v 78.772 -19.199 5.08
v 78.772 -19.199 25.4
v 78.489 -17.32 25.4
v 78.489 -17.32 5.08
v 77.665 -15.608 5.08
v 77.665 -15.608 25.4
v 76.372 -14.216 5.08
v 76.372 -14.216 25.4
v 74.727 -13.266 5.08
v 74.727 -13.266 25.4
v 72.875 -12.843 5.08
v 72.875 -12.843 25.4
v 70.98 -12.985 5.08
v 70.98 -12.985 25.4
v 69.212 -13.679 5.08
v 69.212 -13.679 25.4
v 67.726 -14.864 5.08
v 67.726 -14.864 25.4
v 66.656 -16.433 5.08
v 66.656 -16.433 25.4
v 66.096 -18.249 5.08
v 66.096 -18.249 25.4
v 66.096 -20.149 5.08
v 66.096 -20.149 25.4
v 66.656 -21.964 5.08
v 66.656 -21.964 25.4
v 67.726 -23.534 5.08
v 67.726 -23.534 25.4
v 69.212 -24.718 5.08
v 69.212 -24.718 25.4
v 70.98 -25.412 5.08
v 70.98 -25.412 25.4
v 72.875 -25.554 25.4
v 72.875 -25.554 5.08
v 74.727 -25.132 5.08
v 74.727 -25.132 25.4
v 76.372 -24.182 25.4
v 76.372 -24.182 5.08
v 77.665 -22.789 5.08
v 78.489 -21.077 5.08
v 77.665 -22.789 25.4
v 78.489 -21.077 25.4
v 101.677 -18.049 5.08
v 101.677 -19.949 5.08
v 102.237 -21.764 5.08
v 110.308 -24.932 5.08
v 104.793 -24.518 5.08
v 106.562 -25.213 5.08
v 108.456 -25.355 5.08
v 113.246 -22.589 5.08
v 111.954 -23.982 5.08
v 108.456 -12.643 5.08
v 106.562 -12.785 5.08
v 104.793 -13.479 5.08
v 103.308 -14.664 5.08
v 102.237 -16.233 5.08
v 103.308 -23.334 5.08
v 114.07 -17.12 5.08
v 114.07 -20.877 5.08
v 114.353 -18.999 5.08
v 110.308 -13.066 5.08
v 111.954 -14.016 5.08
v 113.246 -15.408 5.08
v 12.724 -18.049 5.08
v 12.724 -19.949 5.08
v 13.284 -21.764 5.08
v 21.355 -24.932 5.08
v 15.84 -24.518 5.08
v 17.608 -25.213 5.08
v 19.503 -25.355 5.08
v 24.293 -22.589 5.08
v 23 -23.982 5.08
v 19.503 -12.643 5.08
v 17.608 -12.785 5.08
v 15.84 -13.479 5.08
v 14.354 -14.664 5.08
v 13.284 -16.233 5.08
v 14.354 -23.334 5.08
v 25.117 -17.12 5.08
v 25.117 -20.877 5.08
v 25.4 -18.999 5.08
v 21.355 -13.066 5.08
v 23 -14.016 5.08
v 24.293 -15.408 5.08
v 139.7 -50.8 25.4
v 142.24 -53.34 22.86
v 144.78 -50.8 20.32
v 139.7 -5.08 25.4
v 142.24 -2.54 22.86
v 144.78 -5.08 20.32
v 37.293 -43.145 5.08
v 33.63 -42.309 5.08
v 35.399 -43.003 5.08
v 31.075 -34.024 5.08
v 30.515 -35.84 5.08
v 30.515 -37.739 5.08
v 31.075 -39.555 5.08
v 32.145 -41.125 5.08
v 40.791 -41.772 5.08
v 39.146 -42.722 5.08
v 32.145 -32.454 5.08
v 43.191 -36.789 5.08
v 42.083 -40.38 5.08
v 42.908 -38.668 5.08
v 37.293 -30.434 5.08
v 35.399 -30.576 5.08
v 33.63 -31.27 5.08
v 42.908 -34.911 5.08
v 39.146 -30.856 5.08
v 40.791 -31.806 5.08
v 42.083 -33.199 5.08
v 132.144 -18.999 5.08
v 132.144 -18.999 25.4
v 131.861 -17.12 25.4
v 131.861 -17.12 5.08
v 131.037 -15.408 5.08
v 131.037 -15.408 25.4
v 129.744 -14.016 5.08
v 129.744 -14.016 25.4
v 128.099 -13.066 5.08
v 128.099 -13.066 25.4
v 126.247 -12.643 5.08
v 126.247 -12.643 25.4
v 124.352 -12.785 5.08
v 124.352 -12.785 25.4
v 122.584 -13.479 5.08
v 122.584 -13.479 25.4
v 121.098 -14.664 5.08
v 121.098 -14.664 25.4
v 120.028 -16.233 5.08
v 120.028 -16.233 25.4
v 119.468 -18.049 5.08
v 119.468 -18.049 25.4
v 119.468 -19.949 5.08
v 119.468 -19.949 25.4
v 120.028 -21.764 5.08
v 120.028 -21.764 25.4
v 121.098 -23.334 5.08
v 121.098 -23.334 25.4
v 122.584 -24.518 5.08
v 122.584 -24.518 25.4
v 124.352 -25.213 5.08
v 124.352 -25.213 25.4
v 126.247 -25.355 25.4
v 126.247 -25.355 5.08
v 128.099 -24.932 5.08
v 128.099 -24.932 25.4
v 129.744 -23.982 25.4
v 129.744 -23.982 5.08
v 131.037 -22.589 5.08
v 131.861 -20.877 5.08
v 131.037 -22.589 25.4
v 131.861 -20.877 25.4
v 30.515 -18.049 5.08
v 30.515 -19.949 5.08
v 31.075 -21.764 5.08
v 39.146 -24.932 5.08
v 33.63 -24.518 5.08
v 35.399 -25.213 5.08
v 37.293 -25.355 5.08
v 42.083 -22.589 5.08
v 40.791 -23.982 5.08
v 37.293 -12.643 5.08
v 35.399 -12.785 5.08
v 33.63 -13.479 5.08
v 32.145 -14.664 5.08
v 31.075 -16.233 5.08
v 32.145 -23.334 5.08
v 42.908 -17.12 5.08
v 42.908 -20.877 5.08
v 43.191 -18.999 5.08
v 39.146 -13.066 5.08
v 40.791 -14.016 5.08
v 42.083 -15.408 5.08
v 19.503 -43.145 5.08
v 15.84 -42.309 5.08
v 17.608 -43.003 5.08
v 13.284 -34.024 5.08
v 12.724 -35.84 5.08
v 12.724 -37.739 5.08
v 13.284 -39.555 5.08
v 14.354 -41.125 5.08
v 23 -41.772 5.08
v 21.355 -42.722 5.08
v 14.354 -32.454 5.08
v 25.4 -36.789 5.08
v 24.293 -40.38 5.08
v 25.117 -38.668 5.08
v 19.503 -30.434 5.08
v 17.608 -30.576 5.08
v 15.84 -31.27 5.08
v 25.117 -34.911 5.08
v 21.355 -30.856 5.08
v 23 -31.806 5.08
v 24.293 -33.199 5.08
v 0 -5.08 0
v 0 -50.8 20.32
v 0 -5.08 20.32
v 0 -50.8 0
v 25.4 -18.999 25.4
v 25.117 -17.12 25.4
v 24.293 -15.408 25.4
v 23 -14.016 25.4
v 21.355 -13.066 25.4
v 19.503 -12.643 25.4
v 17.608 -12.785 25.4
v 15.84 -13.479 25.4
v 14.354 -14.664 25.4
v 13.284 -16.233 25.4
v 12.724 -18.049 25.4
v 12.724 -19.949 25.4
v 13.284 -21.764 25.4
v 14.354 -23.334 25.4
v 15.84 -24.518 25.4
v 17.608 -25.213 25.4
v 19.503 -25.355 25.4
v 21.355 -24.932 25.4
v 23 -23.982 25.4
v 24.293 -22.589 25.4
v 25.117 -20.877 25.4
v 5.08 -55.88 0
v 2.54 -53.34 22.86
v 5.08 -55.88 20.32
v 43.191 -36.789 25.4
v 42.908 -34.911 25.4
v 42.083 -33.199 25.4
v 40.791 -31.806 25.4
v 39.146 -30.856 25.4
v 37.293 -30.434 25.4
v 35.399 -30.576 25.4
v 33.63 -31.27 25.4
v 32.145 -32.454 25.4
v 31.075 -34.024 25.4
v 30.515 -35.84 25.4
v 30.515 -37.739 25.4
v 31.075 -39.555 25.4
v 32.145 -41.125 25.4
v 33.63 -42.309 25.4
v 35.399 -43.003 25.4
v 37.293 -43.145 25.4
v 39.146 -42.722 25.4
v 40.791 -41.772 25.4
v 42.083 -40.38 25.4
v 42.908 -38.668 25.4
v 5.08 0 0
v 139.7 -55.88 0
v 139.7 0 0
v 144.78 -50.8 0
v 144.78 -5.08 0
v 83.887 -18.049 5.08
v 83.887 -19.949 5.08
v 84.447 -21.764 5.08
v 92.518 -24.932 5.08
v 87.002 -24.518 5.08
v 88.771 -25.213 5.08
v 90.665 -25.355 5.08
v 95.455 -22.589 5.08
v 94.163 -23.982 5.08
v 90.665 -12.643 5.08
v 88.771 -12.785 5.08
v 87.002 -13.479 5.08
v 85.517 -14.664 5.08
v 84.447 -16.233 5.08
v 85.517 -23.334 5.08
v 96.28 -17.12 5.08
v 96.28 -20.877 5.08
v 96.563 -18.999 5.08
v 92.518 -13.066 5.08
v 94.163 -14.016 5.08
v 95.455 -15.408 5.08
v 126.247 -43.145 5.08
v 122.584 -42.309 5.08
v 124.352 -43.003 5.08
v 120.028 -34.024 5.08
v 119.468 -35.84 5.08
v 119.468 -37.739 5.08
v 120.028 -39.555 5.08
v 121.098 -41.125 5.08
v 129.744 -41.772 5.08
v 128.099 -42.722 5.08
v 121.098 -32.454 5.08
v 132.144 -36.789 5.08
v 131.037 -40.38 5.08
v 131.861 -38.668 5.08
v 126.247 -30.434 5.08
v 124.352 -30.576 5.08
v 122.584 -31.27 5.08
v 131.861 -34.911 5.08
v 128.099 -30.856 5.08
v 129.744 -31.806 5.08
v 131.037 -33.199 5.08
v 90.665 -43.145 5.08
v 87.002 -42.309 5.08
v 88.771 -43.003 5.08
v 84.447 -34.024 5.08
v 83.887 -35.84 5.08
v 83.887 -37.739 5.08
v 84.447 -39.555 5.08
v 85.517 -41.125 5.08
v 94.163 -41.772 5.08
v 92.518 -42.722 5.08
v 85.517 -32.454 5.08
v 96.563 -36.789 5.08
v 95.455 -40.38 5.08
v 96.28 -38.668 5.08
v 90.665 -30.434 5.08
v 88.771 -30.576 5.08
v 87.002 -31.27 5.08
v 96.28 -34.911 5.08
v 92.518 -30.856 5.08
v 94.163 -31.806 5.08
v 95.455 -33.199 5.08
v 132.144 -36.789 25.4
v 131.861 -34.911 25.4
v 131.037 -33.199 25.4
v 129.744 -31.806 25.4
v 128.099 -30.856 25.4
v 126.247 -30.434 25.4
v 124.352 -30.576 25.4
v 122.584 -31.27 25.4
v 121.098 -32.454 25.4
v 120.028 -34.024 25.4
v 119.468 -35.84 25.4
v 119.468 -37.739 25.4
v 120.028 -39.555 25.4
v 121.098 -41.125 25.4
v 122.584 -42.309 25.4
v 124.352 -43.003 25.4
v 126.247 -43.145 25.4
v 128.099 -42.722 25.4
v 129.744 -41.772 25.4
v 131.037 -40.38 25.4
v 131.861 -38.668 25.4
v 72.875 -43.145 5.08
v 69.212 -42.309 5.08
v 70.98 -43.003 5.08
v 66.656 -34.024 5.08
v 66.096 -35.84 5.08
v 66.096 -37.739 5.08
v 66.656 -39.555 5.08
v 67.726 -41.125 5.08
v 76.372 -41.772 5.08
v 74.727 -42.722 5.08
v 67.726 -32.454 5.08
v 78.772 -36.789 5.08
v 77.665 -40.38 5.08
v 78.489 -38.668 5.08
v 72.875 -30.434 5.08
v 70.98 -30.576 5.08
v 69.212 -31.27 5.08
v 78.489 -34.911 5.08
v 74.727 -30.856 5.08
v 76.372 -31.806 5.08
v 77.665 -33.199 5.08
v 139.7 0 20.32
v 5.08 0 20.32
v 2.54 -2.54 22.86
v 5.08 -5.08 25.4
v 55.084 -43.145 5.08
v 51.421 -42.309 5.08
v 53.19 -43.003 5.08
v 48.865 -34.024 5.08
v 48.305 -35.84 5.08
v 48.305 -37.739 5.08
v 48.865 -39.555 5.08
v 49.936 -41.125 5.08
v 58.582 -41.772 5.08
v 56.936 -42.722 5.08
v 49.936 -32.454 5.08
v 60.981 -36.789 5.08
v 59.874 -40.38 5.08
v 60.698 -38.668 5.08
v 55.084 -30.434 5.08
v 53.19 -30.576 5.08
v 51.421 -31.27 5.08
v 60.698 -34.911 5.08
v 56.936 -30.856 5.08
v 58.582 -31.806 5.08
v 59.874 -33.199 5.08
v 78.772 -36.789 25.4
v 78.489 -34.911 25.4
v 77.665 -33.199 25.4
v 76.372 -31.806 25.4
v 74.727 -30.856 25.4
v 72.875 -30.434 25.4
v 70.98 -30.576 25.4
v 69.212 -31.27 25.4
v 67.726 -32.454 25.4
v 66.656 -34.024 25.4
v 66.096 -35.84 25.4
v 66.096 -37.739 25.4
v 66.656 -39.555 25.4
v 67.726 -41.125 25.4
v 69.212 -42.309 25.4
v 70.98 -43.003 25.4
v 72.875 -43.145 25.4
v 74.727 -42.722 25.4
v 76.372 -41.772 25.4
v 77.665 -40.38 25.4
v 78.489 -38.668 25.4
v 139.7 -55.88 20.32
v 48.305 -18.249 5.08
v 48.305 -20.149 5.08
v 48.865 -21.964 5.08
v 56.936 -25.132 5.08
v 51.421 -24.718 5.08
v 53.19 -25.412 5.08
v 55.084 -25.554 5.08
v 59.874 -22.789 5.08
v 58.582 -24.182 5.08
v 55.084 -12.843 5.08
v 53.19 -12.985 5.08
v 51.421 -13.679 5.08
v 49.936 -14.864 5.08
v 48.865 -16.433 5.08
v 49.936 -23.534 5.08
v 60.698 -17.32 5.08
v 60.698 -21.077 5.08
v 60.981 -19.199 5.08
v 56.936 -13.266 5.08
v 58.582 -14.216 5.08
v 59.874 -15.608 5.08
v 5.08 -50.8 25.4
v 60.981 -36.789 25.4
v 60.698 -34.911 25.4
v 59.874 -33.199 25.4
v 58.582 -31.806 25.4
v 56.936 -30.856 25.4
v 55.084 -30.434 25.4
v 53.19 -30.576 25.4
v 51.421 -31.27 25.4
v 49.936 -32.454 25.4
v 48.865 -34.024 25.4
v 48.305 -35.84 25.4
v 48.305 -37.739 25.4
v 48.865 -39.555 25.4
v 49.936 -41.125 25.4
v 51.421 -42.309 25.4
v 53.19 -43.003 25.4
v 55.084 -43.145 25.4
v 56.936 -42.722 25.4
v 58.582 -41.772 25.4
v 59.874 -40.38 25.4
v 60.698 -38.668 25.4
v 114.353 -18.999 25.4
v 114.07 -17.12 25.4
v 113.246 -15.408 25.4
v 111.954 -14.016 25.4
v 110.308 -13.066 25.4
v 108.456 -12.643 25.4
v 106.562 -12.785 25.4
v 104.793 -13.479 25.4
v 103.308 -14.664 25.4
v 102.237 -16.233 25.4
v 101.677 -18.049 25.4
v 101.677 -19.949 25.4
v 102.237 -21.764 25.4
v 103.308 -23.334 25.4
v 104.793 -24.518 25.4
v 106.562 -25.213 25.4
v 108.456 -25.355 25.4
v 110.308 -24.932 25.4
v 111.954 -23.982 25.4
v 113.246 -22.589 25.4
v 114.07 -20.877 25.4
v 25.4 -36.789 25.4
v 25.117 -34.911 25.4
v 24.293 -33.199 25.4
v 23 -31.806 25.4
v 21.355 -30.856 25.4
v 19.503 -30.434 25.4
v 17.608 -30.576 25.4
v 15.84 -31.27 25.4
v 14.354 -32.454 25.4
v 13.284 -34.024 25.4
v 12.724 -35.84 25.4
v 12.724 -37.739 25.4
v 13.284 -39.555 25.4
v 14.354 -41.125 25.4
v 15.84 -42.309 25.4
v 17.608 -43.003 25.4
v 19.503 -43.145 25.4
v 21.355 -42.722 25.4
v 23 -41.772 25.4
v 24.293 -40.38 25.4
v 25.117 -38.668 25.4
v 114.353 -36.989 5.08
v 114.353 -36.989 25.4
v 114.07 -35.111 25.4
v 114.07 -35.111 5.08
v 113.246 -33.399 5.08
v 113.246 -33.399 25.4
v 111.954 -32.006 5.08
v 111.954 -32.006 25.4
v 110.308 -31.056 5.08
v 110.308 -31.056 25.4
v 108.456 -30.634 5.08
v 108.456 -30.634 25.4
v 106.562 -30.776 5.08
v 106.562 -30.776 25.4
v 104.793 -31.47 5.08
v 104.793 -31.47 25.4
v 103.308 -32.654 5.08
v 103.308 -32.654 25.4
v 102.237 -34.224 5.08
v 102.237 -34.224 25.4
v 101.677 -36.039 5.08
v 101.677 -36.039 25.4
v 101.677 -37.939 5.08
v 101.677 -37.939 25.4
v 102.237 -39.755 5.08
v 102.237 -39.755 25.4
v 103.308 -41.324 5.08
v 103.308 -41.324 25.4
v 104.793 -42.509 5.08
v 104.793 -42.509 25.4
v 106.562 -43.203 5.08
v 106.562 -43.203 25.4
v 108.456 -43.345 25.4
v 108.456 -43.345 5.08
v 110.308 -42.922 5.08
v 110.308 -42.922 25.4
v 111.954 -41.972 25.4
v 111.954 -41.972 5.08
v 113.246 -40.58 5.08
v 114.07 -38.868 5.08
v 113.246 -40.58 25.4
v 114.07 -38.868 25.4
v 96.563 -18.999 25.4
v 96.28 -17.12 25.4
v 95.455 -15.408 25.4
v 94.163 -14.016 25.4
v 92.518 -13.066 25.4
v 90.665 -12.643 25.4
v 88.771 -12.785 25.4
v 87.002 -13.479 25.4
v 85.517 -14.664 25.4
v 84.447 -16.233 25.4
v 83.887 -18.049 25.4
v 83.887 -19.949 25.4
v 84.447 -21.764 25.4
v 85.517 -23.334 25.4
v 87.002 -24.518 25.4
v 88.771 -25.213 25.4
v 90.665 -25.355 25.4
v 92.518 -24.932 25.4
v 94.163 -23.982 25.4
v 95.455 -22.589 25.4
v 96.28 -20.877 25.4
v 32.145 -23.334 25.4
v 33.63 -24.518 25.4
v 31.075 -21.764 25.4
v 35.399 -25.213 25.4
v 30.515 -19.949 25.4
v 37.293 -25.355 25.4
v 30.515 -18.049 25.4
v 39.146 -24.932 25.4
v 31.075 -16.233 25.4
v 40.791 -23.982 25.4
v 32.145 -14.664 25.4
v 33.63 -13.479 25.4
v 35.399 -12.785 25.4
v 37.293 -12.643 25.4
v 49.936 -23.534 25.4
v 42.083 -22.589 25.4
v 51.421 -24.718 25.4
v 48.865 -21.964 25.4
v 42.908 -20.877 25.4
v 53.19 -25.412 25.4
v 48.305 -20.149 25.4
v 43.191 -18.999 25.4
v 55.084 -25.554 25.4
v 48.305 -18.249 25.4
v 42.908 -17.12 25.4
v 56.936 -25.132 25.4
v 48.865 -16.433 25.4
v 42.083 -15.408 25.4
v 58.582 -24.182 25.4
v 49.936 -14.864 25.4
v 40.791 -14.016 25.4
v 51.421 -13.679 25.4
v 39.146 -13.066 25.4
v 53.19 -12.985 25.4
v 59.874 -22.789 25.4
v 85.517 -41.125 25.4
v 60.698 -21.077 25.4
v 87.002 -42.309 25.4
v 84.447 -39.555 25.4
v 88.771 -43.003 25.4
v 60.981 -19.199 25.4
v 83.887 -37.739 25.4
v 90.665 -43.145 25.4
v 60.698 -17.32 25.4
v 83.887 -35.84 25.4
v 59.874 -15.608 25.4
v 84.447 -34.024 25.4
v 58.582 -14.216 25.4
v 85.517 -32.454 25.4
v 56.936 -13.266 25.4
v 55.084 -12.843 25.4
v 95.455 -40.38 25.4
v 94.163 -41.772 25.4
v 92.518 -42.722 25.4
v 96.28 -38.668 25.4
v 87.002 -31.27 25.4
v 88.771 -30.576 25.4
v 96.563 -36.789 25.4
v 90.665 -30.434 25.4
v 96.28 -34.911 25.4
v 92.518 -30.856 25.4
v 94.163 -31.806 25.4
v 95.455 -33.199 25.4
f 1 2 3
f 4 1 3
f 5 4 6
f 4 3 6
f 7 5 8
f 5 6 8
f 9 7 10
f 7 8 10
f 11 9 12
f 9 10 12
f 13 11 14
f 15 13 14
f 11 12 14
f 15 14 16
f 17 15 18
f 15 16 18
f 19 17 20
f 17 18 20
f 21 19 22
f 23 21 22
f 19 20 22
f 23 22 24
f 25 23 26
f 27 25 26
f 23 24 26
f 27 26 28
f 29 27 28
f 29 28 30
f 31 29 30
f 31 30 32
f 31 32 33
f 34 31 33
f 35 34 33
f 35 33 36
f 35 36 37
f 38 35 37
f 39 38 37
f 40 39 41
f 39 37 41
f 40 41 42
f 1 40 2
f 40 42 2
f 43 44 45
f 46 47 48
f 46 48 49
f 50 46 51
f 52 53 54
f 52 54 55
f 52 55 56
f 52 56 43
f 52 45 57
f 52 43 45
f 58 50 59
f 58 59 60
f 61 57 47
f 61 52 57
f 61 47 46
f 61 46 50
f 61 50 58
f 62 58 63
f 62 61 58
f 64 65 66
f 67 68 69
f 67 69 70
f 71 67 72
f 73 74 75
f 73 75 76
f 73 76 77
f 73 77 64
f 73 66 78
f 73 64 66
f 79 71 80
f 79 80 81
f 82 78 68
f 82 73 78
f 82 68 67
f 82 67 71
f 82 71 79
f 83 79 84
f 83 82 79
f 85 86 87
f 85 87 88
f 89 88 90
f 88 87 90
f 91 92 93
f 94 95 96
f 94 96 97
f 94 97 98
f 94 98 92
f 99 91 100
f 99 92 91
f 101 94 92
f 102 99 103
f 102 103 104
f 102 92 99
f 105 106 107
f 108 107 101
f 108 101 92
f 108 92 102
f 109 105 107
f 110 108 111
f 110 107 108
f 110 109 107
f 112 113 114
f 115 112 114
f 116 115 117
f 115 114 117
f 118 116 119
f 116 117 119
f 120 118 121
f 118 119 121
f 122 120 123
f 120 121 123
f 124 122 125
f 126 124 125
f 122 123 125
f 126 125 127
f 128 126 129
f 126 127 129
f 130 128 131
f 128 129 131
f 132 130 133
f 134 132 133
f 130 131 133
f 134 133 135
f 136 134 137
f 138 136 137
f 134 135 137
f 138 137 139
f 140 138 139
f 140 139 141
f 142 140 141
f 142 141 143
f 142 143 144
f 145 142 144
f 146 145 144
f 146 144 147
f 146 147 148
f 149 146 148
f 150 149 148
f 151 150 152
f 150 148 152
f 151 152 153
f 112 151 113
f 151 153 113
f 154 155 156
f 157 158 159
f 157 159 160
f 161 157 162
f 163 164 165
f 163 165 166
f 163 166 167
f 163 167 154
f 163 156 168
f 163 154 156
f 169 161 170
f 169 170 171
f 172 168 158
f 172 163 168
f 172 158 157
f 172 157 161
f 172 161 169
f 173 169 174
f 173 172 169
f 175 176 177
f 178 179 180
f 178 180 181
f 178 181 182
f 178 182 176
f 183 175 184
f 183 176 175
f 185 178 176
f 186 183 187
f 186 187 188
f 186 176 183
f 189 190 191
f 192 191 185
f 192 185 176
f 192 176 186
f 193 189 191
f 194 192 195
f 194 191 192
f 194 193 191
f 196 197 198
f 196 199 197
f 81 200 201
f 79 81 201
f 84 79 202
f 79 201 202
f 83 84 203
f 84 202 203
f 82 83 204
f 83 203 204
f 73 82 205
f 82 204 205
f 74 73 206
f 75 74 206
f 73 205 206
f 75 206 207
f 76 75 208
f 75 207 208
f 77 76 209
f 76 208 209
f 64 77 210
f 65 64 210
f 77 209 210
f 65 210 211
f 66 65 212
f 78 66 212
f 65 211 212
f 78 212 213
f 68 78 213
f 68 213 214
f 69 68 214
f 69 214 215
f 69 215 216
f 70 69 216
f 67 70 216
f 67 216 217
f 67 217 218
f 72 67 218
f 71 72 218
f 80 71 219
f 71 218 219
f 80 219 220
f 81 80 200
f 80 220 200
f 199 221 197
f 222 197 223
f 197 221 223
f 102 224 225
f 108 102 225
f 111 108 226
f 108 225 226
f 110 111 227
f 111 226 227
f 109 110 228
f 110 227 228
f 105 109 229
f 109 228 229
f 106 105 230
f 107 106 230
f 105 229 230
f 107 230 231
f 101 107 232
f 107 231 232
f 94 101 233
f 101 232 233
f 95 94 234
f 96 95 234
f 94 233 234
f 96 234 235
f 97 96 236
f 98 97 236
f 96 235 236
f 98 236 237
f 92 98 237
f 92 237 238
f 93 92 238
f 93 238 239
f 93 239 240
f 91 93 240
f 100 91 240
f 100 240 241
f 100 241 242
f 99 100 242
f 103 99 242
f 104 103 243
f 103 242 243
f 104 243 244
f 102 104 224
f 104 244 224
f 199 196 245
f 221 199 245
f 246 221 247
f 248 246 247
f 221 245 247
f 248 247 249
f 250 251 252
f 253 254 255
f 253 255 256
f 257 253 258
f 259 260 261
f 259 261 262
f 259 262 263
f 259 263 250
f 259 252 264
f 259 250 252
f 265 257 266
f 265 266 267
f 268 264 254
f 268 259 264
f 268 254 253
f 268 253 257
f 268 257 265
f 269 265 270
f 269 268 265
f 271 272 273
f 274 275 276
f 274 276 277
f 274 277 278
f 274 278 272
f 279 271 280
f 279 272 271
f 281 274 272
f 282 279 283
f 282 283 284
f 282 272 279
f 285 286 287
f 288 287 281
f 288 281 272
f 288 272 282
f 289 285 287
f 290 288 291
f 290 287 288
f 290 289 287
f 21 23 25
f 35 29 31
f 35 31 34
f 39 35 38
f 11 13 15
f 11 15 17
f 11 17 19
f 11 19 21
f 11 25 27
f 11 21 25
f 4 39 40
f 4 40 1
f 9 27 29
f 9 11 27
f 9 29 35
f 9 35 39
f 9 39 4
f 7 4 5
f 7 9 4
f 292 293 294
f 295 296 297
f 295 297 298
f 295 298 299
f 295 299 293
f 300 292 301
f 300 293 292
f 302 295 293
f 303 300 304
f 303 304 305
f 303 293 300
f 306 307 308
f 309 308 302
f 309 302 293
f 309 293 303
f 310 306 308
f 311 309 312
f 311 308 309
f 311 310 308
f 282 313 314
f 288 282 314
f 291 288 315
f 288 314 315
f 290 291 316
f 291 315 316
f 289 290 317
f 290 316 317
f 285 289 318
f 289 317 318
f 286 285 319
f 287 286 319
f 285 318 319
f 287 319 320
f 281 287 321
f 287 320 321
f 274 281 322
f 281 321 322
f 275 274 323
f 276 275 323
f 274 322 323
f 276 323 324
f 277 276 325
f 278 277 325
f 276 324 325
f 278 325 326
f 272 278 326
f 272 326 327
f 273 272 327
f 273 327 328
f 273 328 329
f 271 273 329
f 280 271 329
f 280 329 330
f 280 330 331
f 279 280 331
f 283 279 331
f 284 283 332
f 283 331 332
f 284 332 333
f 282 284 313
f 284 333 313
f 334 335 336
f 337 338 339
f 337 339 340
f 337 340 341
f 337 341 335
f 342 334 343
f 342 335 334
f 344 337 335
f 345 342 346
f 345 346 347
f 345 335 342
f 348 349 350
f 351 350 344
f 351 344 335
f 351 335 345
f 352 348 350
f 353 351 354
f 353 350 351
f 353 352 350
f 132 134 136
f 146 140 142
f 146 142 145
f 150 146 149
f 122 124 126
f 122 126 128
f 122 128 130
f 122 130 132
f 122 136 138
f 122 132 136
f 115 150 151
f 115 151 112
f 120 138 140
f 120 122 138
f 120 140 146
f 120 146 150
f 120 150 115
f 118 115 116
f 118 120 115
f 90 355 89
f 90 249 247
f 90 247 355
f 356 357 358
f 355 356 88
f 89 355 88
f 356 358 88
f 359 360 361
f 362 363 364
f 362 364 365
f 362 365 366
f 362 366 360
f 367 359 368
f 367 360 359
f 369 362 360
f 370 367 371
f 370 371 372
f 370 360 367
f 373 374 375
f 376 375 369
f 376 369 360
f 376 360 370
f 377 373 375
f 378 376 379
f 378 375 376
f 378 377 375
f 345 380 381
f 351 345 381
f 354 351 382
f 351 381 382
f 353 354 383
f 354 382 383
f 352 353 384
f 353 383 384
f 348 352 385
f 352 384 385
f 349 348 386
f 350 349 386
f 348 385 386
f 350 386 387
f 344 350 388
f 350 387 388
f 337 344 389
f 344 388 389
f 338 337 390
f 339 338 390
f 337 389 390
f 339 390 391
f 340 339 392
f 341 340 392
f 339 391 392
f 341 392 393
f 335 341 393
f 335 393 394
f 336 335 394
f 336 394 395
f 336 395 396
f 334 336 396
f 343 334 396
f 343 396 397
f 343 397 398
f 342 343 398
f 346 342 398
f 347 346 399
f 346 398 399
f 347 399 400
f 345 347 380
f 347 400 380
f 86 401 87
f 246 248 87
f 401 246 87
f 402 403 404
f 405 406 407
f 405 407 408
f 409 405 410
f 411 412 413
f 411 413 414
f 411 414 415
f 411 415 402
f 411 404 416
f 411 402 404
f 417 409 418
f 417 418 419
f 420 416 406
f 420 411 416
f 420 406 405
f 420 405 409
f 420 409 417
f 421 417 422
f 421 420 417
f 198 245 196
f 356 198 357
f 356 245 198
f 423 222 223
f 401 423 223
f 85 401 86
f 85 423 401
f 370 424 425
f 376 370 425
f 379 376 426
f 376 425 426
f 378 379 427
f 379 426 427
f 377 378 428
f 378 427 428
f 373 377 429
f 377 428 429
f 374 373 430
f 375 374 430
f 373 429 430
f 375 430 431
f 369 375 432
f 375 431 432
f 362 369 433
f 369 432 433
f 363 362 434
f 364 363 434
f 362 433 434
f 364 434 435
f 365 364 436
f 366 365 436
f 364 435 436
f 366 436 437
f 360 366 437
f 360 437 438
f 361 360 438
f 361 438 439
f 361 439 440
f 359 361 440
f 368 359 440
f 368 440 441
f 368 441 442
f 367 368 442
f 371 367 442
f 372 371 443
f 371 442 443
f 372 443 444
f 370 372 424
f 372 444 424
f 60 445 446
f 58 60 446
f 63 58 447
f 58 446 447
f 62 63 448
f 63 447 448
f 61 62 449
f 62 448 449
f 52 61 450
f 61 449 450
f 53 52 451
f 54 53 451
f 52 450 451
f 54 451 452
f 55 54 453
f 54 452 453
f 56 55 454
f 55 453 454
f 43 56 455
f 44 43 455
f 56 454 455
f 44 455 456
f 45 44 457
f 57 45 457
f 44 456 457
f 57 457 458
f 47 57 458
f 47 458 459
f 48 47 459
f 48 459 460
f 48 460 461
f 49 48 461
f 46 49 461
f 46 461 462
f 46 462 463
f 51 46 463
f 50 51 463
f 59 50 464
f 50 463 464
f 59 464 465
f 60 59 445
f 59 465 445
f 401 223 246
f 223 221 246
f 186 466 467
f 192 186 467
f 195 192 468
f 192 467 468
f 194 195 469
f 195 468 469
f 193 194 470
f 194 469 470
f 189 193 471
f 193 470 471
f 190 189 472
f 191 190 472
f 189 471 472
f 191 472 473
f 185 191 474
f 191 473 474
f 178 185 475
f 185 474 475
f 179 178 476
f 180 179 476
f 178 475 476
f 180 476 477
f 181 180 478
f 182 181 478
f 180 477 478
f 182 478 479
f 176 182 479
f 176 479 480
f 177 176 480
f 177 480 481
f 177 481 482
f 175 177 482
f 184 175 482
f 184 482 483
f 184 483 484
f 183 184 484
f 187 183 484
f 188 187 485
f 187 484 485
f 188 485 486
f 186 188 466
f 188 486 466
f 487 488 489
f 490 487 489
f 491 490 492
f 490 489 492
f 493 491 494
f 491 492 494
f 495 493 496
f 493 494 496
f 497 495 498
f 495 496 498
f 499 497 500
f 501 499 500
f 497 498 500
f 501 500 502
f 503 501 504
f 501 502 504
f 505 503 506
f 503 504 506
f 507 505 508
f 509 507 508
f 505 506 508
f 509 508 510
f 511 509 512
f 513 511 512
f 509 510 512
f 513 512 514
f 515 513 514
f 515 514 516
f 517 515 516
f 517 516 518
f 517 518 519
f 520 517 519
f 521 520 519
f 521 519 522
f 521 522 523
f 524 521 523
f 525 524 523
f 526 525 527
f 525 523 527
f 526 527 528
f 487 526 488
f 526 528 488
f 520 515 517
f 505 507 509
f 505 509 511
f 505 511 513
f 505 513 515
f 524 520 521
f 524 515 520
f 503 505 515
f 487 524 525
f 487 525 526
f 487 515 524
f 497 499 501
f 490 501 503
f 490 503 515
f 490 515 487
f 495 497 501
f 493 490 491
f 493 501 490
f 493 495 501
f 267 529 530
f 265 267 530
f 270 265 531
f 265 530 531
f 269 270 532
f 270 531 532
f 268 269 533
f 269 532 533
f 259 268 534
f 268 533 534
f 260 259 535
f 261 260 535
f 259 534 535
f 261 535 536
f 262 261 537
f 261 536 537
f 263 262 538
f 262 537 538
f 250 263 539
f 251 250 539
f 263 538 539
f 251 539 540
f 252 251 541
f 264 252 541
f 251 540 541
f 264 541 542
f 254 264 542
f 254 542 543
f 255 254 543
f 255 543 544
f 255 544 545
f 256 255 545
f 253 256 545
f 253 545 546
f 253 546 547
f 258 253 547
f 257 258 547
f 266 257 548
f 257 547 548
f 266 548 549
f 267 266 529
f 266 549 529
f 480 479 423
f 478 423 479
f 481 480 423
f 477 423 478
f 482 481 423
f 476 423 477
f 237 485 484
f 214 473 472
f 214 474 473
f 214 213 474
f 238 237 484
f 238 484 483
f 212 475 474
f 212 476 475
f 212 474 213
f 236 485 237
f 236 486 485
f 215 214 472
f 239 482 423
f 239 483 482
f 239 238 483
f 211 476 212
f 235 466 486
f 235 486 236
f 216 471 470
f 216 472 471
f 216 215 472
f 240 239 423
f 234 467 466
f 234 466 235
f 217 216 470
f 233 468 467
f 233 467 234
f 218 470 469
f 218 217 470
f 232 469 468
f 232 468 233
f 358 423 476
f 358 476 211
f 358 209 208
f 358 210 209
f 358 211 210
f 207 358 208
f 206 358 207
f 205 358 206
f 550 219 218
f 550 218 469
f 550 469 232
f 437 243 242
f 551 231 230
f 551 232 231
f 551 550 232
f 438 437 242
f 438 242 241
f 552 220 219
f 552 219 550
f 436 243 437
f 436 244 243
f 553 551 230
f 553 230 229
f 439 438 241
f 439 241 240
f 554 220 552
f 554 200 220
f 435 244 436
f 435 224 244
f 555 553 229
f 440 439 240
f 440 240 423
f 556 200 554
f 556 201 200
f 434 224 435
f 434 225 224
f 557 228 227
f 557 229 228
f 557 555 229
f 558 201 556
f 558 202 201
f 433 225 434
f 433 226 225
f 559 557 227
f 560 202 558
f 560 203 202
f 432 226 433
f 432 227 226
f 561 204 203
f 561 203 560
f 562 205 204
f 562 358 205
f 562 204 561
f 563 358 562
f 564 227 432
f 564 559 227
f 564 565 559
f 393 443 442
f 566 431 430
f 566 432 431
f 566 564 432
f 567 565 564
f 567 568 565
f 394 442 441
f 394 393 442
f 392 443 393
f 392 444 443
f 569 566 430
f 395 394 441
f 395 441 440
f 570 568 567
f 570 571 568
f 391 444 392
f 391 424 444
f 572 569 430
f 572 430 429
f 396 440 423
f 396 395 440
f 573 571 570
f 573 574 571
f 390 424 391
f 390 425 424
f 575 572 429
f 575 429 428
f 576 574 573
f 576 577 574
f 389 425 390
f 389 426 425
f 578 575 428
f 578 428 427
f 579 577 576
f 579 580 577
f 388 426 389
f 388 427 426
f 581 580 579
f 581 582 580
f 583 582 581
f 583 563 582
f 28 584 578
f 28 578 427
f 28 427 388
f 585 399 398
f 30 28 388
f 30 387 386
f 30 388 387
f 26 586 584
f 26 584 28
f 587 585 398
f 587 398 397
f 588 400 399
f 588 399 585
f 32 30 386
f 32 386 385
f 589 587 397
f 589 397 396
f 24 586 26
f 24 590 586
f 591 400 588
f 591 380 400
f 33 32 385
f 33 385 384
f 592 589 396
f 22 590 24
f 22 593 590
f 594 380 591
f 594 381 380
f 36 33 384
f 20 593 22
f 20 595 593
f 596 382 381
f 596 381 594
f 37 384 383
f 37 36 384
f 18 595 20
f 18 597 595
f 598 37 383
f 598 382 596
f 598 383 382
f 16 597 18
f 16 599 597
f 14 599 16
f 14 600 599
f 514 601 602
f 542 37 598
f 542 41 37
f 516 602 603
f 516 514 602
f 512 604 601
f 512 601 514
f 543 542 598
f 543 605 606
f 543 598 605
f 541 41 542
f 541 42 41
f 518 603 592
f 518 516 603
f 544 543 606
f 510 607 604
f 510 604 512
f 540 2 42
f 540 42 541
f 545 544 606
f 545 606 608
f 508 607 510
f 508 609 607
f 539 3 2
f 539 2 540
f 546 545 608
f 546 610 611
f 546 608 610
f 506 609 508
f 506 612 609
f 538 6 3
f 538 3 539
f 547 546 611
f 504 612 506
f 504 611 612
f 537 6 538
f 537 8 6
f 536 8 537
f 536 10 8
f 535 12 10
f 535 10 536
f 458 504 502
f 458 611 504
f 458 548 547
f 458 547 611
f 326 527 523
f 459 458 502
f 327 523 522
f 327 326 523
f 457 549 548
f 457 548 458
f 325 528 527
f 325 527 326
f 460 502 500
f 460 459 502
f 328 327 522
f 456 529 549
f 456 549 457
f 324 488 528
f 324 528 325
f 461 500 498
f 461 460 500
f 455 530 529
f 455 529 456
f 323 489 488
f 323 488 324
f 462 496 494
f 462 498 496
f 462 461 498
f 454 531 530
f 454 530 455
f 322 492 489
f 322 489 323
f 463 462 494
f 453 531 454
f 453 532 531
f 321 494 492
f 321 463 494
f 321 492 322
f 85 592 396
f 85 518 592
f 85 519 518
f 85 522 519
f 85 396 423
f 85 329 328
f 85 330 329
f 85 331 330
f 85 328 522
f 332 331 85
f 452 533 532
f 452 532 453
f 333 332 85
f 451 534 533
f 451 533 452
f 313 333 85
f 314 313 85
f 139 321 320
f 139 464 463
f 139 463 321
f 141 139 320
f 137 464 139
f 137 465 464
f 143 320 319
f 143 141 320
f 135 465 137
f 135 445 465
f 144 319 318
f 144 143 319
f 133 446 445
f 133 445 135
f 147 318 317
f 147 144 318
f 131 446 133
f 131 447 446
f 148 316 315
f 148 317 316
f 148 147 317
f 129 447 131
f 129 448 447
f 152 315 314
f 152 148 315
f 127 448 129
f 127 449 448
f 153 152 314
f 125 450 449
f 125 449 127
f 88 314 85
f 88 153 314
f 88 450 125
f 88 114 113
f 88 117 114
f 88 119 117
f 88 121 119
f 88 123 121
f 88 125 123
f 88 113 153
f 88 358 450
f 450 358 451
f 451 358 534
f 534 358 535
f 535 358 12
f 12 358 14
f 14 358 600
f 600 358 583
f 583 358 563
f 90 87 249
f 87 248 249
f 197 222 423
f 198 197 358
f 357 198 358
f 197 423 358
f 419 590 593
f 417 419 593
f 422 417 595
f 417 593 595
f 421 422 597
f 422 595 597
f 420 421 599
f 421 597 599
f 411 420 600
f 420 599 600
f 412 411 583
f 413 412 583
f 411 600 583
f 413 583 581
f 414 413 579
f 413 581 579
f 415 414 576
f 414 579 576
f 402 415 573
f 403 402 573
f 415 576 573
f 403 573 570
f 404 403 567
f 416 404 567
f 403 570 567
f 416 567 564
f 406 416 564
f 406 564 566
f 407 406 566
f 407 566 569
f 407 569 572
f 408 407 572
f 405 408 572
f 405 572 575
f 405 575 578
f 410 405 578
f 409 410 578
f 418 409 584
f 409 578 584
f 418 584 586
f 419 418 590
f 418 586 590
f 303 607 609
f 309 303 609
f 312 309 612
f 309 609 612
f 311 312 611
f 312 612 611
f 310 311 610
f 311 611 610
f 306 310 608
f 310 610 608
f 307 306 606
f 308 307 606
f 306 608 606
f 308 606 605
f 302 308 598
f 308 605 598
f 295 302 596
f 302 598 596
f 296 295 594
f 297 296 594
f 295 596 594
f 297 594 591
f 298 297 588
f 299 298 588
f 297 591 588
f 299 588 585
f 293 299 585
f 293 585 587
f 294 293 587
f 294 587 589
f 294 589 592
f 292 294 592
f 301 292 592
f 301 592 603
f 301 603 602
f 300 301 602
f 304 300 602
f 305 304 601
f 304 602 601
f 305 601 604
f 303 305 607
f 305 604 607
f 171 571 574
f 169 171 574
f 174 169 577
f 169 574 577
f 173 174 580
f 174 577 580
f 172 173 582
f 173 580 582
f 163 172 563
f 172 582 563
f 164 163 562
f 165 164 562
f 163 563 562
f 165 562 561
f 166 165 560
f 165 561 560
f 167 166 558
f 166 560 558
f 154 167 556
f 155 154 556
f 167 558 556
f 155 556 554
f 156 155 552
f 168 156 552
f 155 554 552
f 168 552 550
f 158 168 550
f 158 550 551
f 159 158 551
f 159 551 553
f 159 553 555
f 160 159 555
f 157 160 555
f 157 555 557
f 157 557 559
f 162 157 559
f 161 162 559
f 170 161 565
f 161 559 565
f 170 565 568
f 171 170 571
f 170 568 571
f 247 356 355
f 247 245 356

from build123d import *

# Parameters (mm, degrees)
F0_W     = 144.78
F0_H     = 55.88
F1_DEPTH = 25.4
F2_R     = 6.37356
F3_DEPTH = 20.32
F4_SIZE  = 5.08
F5_SIZE  = 5.08


with BuildPart() as f1:
    # F0 (on Top) → F1 (new body)
    with BuildSketch(Plane.XY):
        with Locations((72.39, -27.94)):
            Rectangle(F0_W, F0_H)
    extrude(amount=F1_DEPTH)

    # F2 (on face) → F3 (cut)
    with BuildSketch(Plane.XY.offset(25.4)):
        with Locations((125.770479, -18.998763)):
            Circle(F2_R)
        with Locations((125.770479, -36.789436)):
            Circle(F2_R)
        with Locations((107.979804, -36.989331)):
            Circle(F2_R)
        with Locations((107.979804, -18.998763)):
            Circle(F2_R)
        with Locations((90.189137, -18.998763)):
            Circle(F2_R)
        with Locations((90.189137, -36.789436)):
            Circle(F2_R)
        with Locations((72.398461, -36.789436)):
            Circle(F2_R)
        with Locations((72.398461, -19.19866)):
            Circle(F2_R)
        with Locations((54.60779, -19.19866)):
            Circle(F2_R)
        with Locations((54.60779, -36.789436)):
            Circle(F2_R)
        with Locations((36.817115, -36.789436)):
            Circle(F2_R)
        with Locations((36.817115, -18.998763)):
            Circle(F2_R)
        with Locations((19.02644, -18.998763)):
            Circle(F2_R)
        with Locations((19.02644, -36.789436)):
            Circle(F2_R)
    extrude(amount=-F3_DEPTH, mode=Mode.SUBTRACT)

    # F4
    f4_edges = [f1.edges().sort_by_distance(p)[0] for p in [
        (72.39, -55.88, 25.4),
        (72.39, 0, 25.4),
        (144.78, -27.94, 25.4),
        (0, -27.94, 25.4),
    ]]
    chamfer(f4_edges, length=F4_SIZE)

    # F5
    f5_edges = [f1.edges().sort_by_distance(p)[0] for p in [
        (144.78, -55.88, 10.16),
        (144.78, 0, 10.16),
        (0, -55.88, 10.16),
        (0, 0, 10.16),
    ]]
    chamfer(f5_edges, length=F5_SIZE)


solid = f1.part
